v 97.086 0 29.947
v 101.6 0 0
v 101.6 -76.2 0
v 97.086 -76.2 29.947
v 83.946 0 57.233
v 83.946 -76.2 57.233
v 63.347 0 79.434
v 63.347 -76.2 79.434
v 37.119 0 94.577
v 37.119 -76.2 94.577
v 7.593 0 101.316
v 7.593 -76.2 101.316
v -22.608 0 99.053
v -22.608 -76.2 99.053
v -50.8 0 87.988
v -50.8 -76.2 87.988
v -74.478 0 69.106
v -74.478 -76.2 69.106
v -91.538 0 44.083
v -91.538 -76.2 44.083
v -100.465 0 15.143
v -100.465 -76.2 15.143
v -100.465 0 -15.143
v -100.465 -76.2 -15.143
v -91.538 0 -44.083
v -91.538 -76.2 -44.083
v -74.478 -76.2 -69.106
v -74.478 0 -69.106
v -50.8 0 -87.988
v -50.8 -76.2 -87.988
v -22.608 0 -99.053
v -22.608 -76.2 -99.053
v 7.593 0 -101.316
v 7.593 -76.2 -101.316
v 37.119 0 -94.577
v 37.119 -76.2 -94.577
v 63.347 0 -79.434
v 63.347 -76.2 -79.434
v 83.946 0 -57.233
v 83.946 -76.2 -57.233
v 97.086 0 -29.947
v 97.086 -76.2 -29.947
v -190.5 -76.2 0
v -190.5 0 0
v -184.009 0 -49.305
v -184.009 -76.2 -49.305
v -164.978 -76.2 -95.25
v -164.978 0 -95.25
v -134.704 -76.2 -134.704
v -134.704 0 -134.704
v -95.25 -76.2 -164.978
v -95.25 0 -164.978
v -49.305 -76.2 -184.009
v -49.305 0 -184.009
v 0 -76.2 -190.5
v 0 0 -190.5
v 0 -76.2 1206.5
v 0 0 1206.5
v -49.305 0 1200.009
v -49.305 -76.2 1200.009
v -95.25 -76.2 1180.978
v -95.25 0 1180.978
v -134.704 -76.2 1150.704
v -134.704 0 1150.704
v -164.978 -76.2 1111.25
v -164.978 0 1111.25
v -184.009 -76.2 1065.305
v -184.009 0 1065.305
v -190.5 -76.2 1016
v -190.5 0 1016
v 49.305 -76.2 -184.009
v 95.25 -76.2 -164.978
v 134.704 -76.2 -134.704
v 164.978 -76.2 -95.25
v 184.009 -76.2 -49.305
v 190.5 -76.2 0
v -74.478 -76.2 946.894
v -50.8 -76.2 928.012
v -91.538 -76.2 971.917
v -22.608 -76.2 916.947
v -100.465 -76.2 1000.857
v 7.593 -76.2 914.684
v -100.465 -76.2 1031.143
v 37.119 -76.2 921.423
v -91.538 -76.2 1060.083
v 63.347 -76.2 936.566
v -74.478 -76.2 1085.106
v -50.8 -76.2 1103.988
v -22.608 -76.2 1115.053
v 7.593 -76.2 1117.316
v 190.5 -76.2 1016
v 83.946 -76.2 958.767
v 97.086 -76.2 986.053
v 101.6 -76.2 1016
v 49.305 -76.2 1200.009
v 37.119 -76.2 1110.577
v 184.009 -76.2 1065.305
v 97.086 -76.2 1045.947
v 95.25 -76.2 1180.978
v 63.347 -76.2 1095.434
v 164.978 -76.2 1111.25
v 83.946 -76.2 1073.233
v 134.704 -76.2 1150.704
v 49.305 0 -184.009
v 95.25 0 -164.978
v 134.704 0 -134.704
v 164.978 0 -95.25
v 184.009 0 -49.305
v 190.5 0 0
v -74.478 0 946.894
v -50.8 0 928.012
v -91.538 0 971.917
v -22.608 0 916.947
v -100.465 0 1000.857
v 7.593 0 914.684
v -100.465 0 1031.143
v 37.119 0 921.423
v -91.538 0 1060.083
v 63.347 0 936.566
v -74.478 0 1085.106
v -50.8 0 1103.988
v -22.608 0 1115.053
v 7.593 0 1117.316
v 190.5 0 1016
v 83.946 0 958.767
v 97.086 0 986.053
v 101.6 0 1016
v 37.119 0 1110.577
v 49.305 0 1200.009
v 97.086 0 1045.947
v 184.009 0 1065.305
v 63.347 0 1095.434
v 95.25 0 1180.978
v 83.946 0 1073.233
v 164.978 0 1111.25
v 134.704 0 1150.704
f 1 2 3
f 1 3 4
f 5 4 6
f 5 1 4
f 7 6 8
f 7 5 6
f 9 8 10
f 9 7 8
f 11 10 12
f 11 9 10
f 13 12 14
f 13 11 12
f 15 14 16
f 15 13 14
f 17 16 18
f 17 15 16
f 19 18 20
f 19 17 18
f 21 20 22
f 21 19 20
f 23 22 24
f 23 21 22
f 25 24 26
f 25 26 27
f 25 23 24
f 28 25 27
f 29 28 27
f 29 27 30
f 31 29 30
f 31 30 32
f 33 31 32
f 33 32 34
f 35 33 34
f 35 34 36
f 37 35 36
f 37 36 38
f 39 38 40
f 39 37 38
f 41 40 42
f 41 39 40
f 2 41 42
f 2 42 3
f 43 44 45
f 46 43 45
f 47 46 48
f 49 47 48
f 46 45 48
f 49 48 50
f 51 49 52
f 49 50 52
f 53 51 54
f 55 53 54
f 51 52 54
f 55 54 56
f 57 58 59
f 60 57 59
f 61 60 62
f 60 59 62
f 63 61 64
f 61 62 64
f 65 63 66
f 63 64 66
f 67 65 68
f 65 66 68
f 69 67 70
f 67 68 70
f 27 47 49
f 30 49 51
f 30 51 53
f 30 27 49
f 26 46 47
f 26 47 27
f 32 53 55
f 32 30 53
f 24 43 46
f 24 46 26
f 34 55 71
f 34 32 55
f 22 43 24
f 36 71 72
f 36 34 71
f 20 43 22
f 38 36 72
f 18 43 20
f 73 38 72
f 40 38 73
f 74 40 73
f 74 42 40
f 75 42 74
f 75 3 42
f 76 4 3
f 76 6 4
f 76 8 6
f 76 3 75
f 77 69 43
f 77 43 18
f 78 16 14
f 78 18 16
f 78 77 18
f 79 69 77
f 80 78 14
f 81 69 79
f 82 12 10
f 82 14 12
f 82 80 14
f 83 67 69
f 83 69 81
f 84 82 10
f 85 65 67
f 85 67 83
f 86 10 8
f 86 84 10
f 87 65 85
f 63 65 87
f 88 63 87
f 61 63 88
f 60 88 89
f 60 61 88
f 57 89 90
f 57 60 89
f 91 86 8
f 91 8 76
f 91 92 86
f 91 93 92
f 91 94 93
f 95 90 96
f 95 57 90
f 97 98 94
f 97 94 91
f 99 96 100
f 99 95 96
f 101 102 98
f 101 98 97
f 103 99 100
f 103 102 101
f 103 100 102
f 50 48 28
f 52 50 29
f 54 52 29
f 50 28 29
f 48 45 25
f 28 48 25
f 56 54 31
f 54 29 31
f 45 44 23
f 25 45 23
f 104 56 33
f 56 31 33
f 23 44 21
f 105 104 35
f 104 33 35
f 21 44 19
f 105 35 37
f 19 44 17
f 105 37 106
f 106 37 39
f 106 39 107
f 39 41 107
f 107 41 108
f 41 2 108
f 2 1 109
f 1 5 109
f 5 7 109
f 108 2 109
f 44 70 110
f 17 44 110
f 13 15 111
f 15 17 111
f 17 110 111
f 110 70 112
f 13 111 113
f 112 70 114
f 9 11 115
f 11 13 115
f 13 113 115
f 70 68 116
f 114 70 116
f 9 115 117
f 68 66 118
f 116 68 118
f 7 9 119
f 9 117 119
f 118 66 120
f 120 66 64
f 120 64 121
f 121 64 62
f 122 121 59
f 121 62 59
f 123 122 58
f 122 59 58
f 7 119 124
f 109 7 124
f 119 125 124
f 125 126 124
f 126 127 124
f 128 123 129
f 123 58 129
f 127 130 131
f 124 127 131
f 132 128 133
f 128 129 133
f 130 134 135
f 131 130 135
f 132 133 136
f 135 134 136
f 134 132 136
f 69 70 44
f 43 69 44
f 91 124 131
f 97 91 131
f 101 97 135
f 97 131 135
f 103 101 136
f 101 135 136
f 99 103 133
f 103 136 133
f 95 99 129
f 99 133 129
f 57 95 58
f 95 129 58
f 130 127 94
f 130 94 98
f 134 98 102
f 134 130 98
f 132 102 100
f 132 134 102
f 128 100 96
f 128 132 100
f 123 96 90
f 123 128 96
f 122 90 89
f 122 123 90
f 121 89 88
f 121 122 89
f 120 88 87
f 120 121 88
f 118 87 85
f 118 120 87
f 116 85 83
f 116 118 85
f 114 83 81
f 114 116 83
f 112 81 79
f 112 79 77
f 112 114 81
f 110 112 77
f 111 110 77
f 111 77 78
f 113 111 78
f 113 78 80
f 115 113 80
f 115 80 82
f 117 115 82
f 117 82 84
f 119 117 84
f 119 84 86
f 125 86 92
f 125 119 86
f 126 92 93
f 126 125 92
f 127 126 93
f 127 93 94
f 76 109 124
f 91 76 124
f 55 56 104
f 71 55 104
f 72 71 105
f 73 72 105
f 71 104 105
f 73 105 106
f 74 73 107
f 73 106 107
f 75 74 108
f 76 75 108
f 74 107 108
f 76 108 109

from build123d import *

# Parameters (mm, degrees)
F0_R     = 101.6
F1_DEPTH = 76.2


with BuildPart() as f1:
    # F0 (on Front) → F1 (new body)
    with BuildSketch(Plane.XZ):
        with BuildLine():
            Line((-190.5, 1016), (-190.5, 0))
            ThreePointArc((-190.5, 0), (-134.703842, -134.703842), (0, -190.5))
            ThreePointArc((0, -190.5), (134.703842, -134.703842), (190.5, 0))
            Line((190.5, 0), (190.5, 1016))
            ThreePointArc((190.5, 1016), (134.703842, 1150.703842), (0, 1206.5))
            ThreePointArc((0, 1206.5), (-134.703842, 1150.703842), (-190.5, 1016))
        make_face()
        Circle(F0_R, mode=Mode.SUBTRACT)
        with Locations((0, 1016)):
            Circle(F0_R, mode=Mode.SUBTRACT)
    extrude(amount=F1_DEPTH)


solid = f1.part
